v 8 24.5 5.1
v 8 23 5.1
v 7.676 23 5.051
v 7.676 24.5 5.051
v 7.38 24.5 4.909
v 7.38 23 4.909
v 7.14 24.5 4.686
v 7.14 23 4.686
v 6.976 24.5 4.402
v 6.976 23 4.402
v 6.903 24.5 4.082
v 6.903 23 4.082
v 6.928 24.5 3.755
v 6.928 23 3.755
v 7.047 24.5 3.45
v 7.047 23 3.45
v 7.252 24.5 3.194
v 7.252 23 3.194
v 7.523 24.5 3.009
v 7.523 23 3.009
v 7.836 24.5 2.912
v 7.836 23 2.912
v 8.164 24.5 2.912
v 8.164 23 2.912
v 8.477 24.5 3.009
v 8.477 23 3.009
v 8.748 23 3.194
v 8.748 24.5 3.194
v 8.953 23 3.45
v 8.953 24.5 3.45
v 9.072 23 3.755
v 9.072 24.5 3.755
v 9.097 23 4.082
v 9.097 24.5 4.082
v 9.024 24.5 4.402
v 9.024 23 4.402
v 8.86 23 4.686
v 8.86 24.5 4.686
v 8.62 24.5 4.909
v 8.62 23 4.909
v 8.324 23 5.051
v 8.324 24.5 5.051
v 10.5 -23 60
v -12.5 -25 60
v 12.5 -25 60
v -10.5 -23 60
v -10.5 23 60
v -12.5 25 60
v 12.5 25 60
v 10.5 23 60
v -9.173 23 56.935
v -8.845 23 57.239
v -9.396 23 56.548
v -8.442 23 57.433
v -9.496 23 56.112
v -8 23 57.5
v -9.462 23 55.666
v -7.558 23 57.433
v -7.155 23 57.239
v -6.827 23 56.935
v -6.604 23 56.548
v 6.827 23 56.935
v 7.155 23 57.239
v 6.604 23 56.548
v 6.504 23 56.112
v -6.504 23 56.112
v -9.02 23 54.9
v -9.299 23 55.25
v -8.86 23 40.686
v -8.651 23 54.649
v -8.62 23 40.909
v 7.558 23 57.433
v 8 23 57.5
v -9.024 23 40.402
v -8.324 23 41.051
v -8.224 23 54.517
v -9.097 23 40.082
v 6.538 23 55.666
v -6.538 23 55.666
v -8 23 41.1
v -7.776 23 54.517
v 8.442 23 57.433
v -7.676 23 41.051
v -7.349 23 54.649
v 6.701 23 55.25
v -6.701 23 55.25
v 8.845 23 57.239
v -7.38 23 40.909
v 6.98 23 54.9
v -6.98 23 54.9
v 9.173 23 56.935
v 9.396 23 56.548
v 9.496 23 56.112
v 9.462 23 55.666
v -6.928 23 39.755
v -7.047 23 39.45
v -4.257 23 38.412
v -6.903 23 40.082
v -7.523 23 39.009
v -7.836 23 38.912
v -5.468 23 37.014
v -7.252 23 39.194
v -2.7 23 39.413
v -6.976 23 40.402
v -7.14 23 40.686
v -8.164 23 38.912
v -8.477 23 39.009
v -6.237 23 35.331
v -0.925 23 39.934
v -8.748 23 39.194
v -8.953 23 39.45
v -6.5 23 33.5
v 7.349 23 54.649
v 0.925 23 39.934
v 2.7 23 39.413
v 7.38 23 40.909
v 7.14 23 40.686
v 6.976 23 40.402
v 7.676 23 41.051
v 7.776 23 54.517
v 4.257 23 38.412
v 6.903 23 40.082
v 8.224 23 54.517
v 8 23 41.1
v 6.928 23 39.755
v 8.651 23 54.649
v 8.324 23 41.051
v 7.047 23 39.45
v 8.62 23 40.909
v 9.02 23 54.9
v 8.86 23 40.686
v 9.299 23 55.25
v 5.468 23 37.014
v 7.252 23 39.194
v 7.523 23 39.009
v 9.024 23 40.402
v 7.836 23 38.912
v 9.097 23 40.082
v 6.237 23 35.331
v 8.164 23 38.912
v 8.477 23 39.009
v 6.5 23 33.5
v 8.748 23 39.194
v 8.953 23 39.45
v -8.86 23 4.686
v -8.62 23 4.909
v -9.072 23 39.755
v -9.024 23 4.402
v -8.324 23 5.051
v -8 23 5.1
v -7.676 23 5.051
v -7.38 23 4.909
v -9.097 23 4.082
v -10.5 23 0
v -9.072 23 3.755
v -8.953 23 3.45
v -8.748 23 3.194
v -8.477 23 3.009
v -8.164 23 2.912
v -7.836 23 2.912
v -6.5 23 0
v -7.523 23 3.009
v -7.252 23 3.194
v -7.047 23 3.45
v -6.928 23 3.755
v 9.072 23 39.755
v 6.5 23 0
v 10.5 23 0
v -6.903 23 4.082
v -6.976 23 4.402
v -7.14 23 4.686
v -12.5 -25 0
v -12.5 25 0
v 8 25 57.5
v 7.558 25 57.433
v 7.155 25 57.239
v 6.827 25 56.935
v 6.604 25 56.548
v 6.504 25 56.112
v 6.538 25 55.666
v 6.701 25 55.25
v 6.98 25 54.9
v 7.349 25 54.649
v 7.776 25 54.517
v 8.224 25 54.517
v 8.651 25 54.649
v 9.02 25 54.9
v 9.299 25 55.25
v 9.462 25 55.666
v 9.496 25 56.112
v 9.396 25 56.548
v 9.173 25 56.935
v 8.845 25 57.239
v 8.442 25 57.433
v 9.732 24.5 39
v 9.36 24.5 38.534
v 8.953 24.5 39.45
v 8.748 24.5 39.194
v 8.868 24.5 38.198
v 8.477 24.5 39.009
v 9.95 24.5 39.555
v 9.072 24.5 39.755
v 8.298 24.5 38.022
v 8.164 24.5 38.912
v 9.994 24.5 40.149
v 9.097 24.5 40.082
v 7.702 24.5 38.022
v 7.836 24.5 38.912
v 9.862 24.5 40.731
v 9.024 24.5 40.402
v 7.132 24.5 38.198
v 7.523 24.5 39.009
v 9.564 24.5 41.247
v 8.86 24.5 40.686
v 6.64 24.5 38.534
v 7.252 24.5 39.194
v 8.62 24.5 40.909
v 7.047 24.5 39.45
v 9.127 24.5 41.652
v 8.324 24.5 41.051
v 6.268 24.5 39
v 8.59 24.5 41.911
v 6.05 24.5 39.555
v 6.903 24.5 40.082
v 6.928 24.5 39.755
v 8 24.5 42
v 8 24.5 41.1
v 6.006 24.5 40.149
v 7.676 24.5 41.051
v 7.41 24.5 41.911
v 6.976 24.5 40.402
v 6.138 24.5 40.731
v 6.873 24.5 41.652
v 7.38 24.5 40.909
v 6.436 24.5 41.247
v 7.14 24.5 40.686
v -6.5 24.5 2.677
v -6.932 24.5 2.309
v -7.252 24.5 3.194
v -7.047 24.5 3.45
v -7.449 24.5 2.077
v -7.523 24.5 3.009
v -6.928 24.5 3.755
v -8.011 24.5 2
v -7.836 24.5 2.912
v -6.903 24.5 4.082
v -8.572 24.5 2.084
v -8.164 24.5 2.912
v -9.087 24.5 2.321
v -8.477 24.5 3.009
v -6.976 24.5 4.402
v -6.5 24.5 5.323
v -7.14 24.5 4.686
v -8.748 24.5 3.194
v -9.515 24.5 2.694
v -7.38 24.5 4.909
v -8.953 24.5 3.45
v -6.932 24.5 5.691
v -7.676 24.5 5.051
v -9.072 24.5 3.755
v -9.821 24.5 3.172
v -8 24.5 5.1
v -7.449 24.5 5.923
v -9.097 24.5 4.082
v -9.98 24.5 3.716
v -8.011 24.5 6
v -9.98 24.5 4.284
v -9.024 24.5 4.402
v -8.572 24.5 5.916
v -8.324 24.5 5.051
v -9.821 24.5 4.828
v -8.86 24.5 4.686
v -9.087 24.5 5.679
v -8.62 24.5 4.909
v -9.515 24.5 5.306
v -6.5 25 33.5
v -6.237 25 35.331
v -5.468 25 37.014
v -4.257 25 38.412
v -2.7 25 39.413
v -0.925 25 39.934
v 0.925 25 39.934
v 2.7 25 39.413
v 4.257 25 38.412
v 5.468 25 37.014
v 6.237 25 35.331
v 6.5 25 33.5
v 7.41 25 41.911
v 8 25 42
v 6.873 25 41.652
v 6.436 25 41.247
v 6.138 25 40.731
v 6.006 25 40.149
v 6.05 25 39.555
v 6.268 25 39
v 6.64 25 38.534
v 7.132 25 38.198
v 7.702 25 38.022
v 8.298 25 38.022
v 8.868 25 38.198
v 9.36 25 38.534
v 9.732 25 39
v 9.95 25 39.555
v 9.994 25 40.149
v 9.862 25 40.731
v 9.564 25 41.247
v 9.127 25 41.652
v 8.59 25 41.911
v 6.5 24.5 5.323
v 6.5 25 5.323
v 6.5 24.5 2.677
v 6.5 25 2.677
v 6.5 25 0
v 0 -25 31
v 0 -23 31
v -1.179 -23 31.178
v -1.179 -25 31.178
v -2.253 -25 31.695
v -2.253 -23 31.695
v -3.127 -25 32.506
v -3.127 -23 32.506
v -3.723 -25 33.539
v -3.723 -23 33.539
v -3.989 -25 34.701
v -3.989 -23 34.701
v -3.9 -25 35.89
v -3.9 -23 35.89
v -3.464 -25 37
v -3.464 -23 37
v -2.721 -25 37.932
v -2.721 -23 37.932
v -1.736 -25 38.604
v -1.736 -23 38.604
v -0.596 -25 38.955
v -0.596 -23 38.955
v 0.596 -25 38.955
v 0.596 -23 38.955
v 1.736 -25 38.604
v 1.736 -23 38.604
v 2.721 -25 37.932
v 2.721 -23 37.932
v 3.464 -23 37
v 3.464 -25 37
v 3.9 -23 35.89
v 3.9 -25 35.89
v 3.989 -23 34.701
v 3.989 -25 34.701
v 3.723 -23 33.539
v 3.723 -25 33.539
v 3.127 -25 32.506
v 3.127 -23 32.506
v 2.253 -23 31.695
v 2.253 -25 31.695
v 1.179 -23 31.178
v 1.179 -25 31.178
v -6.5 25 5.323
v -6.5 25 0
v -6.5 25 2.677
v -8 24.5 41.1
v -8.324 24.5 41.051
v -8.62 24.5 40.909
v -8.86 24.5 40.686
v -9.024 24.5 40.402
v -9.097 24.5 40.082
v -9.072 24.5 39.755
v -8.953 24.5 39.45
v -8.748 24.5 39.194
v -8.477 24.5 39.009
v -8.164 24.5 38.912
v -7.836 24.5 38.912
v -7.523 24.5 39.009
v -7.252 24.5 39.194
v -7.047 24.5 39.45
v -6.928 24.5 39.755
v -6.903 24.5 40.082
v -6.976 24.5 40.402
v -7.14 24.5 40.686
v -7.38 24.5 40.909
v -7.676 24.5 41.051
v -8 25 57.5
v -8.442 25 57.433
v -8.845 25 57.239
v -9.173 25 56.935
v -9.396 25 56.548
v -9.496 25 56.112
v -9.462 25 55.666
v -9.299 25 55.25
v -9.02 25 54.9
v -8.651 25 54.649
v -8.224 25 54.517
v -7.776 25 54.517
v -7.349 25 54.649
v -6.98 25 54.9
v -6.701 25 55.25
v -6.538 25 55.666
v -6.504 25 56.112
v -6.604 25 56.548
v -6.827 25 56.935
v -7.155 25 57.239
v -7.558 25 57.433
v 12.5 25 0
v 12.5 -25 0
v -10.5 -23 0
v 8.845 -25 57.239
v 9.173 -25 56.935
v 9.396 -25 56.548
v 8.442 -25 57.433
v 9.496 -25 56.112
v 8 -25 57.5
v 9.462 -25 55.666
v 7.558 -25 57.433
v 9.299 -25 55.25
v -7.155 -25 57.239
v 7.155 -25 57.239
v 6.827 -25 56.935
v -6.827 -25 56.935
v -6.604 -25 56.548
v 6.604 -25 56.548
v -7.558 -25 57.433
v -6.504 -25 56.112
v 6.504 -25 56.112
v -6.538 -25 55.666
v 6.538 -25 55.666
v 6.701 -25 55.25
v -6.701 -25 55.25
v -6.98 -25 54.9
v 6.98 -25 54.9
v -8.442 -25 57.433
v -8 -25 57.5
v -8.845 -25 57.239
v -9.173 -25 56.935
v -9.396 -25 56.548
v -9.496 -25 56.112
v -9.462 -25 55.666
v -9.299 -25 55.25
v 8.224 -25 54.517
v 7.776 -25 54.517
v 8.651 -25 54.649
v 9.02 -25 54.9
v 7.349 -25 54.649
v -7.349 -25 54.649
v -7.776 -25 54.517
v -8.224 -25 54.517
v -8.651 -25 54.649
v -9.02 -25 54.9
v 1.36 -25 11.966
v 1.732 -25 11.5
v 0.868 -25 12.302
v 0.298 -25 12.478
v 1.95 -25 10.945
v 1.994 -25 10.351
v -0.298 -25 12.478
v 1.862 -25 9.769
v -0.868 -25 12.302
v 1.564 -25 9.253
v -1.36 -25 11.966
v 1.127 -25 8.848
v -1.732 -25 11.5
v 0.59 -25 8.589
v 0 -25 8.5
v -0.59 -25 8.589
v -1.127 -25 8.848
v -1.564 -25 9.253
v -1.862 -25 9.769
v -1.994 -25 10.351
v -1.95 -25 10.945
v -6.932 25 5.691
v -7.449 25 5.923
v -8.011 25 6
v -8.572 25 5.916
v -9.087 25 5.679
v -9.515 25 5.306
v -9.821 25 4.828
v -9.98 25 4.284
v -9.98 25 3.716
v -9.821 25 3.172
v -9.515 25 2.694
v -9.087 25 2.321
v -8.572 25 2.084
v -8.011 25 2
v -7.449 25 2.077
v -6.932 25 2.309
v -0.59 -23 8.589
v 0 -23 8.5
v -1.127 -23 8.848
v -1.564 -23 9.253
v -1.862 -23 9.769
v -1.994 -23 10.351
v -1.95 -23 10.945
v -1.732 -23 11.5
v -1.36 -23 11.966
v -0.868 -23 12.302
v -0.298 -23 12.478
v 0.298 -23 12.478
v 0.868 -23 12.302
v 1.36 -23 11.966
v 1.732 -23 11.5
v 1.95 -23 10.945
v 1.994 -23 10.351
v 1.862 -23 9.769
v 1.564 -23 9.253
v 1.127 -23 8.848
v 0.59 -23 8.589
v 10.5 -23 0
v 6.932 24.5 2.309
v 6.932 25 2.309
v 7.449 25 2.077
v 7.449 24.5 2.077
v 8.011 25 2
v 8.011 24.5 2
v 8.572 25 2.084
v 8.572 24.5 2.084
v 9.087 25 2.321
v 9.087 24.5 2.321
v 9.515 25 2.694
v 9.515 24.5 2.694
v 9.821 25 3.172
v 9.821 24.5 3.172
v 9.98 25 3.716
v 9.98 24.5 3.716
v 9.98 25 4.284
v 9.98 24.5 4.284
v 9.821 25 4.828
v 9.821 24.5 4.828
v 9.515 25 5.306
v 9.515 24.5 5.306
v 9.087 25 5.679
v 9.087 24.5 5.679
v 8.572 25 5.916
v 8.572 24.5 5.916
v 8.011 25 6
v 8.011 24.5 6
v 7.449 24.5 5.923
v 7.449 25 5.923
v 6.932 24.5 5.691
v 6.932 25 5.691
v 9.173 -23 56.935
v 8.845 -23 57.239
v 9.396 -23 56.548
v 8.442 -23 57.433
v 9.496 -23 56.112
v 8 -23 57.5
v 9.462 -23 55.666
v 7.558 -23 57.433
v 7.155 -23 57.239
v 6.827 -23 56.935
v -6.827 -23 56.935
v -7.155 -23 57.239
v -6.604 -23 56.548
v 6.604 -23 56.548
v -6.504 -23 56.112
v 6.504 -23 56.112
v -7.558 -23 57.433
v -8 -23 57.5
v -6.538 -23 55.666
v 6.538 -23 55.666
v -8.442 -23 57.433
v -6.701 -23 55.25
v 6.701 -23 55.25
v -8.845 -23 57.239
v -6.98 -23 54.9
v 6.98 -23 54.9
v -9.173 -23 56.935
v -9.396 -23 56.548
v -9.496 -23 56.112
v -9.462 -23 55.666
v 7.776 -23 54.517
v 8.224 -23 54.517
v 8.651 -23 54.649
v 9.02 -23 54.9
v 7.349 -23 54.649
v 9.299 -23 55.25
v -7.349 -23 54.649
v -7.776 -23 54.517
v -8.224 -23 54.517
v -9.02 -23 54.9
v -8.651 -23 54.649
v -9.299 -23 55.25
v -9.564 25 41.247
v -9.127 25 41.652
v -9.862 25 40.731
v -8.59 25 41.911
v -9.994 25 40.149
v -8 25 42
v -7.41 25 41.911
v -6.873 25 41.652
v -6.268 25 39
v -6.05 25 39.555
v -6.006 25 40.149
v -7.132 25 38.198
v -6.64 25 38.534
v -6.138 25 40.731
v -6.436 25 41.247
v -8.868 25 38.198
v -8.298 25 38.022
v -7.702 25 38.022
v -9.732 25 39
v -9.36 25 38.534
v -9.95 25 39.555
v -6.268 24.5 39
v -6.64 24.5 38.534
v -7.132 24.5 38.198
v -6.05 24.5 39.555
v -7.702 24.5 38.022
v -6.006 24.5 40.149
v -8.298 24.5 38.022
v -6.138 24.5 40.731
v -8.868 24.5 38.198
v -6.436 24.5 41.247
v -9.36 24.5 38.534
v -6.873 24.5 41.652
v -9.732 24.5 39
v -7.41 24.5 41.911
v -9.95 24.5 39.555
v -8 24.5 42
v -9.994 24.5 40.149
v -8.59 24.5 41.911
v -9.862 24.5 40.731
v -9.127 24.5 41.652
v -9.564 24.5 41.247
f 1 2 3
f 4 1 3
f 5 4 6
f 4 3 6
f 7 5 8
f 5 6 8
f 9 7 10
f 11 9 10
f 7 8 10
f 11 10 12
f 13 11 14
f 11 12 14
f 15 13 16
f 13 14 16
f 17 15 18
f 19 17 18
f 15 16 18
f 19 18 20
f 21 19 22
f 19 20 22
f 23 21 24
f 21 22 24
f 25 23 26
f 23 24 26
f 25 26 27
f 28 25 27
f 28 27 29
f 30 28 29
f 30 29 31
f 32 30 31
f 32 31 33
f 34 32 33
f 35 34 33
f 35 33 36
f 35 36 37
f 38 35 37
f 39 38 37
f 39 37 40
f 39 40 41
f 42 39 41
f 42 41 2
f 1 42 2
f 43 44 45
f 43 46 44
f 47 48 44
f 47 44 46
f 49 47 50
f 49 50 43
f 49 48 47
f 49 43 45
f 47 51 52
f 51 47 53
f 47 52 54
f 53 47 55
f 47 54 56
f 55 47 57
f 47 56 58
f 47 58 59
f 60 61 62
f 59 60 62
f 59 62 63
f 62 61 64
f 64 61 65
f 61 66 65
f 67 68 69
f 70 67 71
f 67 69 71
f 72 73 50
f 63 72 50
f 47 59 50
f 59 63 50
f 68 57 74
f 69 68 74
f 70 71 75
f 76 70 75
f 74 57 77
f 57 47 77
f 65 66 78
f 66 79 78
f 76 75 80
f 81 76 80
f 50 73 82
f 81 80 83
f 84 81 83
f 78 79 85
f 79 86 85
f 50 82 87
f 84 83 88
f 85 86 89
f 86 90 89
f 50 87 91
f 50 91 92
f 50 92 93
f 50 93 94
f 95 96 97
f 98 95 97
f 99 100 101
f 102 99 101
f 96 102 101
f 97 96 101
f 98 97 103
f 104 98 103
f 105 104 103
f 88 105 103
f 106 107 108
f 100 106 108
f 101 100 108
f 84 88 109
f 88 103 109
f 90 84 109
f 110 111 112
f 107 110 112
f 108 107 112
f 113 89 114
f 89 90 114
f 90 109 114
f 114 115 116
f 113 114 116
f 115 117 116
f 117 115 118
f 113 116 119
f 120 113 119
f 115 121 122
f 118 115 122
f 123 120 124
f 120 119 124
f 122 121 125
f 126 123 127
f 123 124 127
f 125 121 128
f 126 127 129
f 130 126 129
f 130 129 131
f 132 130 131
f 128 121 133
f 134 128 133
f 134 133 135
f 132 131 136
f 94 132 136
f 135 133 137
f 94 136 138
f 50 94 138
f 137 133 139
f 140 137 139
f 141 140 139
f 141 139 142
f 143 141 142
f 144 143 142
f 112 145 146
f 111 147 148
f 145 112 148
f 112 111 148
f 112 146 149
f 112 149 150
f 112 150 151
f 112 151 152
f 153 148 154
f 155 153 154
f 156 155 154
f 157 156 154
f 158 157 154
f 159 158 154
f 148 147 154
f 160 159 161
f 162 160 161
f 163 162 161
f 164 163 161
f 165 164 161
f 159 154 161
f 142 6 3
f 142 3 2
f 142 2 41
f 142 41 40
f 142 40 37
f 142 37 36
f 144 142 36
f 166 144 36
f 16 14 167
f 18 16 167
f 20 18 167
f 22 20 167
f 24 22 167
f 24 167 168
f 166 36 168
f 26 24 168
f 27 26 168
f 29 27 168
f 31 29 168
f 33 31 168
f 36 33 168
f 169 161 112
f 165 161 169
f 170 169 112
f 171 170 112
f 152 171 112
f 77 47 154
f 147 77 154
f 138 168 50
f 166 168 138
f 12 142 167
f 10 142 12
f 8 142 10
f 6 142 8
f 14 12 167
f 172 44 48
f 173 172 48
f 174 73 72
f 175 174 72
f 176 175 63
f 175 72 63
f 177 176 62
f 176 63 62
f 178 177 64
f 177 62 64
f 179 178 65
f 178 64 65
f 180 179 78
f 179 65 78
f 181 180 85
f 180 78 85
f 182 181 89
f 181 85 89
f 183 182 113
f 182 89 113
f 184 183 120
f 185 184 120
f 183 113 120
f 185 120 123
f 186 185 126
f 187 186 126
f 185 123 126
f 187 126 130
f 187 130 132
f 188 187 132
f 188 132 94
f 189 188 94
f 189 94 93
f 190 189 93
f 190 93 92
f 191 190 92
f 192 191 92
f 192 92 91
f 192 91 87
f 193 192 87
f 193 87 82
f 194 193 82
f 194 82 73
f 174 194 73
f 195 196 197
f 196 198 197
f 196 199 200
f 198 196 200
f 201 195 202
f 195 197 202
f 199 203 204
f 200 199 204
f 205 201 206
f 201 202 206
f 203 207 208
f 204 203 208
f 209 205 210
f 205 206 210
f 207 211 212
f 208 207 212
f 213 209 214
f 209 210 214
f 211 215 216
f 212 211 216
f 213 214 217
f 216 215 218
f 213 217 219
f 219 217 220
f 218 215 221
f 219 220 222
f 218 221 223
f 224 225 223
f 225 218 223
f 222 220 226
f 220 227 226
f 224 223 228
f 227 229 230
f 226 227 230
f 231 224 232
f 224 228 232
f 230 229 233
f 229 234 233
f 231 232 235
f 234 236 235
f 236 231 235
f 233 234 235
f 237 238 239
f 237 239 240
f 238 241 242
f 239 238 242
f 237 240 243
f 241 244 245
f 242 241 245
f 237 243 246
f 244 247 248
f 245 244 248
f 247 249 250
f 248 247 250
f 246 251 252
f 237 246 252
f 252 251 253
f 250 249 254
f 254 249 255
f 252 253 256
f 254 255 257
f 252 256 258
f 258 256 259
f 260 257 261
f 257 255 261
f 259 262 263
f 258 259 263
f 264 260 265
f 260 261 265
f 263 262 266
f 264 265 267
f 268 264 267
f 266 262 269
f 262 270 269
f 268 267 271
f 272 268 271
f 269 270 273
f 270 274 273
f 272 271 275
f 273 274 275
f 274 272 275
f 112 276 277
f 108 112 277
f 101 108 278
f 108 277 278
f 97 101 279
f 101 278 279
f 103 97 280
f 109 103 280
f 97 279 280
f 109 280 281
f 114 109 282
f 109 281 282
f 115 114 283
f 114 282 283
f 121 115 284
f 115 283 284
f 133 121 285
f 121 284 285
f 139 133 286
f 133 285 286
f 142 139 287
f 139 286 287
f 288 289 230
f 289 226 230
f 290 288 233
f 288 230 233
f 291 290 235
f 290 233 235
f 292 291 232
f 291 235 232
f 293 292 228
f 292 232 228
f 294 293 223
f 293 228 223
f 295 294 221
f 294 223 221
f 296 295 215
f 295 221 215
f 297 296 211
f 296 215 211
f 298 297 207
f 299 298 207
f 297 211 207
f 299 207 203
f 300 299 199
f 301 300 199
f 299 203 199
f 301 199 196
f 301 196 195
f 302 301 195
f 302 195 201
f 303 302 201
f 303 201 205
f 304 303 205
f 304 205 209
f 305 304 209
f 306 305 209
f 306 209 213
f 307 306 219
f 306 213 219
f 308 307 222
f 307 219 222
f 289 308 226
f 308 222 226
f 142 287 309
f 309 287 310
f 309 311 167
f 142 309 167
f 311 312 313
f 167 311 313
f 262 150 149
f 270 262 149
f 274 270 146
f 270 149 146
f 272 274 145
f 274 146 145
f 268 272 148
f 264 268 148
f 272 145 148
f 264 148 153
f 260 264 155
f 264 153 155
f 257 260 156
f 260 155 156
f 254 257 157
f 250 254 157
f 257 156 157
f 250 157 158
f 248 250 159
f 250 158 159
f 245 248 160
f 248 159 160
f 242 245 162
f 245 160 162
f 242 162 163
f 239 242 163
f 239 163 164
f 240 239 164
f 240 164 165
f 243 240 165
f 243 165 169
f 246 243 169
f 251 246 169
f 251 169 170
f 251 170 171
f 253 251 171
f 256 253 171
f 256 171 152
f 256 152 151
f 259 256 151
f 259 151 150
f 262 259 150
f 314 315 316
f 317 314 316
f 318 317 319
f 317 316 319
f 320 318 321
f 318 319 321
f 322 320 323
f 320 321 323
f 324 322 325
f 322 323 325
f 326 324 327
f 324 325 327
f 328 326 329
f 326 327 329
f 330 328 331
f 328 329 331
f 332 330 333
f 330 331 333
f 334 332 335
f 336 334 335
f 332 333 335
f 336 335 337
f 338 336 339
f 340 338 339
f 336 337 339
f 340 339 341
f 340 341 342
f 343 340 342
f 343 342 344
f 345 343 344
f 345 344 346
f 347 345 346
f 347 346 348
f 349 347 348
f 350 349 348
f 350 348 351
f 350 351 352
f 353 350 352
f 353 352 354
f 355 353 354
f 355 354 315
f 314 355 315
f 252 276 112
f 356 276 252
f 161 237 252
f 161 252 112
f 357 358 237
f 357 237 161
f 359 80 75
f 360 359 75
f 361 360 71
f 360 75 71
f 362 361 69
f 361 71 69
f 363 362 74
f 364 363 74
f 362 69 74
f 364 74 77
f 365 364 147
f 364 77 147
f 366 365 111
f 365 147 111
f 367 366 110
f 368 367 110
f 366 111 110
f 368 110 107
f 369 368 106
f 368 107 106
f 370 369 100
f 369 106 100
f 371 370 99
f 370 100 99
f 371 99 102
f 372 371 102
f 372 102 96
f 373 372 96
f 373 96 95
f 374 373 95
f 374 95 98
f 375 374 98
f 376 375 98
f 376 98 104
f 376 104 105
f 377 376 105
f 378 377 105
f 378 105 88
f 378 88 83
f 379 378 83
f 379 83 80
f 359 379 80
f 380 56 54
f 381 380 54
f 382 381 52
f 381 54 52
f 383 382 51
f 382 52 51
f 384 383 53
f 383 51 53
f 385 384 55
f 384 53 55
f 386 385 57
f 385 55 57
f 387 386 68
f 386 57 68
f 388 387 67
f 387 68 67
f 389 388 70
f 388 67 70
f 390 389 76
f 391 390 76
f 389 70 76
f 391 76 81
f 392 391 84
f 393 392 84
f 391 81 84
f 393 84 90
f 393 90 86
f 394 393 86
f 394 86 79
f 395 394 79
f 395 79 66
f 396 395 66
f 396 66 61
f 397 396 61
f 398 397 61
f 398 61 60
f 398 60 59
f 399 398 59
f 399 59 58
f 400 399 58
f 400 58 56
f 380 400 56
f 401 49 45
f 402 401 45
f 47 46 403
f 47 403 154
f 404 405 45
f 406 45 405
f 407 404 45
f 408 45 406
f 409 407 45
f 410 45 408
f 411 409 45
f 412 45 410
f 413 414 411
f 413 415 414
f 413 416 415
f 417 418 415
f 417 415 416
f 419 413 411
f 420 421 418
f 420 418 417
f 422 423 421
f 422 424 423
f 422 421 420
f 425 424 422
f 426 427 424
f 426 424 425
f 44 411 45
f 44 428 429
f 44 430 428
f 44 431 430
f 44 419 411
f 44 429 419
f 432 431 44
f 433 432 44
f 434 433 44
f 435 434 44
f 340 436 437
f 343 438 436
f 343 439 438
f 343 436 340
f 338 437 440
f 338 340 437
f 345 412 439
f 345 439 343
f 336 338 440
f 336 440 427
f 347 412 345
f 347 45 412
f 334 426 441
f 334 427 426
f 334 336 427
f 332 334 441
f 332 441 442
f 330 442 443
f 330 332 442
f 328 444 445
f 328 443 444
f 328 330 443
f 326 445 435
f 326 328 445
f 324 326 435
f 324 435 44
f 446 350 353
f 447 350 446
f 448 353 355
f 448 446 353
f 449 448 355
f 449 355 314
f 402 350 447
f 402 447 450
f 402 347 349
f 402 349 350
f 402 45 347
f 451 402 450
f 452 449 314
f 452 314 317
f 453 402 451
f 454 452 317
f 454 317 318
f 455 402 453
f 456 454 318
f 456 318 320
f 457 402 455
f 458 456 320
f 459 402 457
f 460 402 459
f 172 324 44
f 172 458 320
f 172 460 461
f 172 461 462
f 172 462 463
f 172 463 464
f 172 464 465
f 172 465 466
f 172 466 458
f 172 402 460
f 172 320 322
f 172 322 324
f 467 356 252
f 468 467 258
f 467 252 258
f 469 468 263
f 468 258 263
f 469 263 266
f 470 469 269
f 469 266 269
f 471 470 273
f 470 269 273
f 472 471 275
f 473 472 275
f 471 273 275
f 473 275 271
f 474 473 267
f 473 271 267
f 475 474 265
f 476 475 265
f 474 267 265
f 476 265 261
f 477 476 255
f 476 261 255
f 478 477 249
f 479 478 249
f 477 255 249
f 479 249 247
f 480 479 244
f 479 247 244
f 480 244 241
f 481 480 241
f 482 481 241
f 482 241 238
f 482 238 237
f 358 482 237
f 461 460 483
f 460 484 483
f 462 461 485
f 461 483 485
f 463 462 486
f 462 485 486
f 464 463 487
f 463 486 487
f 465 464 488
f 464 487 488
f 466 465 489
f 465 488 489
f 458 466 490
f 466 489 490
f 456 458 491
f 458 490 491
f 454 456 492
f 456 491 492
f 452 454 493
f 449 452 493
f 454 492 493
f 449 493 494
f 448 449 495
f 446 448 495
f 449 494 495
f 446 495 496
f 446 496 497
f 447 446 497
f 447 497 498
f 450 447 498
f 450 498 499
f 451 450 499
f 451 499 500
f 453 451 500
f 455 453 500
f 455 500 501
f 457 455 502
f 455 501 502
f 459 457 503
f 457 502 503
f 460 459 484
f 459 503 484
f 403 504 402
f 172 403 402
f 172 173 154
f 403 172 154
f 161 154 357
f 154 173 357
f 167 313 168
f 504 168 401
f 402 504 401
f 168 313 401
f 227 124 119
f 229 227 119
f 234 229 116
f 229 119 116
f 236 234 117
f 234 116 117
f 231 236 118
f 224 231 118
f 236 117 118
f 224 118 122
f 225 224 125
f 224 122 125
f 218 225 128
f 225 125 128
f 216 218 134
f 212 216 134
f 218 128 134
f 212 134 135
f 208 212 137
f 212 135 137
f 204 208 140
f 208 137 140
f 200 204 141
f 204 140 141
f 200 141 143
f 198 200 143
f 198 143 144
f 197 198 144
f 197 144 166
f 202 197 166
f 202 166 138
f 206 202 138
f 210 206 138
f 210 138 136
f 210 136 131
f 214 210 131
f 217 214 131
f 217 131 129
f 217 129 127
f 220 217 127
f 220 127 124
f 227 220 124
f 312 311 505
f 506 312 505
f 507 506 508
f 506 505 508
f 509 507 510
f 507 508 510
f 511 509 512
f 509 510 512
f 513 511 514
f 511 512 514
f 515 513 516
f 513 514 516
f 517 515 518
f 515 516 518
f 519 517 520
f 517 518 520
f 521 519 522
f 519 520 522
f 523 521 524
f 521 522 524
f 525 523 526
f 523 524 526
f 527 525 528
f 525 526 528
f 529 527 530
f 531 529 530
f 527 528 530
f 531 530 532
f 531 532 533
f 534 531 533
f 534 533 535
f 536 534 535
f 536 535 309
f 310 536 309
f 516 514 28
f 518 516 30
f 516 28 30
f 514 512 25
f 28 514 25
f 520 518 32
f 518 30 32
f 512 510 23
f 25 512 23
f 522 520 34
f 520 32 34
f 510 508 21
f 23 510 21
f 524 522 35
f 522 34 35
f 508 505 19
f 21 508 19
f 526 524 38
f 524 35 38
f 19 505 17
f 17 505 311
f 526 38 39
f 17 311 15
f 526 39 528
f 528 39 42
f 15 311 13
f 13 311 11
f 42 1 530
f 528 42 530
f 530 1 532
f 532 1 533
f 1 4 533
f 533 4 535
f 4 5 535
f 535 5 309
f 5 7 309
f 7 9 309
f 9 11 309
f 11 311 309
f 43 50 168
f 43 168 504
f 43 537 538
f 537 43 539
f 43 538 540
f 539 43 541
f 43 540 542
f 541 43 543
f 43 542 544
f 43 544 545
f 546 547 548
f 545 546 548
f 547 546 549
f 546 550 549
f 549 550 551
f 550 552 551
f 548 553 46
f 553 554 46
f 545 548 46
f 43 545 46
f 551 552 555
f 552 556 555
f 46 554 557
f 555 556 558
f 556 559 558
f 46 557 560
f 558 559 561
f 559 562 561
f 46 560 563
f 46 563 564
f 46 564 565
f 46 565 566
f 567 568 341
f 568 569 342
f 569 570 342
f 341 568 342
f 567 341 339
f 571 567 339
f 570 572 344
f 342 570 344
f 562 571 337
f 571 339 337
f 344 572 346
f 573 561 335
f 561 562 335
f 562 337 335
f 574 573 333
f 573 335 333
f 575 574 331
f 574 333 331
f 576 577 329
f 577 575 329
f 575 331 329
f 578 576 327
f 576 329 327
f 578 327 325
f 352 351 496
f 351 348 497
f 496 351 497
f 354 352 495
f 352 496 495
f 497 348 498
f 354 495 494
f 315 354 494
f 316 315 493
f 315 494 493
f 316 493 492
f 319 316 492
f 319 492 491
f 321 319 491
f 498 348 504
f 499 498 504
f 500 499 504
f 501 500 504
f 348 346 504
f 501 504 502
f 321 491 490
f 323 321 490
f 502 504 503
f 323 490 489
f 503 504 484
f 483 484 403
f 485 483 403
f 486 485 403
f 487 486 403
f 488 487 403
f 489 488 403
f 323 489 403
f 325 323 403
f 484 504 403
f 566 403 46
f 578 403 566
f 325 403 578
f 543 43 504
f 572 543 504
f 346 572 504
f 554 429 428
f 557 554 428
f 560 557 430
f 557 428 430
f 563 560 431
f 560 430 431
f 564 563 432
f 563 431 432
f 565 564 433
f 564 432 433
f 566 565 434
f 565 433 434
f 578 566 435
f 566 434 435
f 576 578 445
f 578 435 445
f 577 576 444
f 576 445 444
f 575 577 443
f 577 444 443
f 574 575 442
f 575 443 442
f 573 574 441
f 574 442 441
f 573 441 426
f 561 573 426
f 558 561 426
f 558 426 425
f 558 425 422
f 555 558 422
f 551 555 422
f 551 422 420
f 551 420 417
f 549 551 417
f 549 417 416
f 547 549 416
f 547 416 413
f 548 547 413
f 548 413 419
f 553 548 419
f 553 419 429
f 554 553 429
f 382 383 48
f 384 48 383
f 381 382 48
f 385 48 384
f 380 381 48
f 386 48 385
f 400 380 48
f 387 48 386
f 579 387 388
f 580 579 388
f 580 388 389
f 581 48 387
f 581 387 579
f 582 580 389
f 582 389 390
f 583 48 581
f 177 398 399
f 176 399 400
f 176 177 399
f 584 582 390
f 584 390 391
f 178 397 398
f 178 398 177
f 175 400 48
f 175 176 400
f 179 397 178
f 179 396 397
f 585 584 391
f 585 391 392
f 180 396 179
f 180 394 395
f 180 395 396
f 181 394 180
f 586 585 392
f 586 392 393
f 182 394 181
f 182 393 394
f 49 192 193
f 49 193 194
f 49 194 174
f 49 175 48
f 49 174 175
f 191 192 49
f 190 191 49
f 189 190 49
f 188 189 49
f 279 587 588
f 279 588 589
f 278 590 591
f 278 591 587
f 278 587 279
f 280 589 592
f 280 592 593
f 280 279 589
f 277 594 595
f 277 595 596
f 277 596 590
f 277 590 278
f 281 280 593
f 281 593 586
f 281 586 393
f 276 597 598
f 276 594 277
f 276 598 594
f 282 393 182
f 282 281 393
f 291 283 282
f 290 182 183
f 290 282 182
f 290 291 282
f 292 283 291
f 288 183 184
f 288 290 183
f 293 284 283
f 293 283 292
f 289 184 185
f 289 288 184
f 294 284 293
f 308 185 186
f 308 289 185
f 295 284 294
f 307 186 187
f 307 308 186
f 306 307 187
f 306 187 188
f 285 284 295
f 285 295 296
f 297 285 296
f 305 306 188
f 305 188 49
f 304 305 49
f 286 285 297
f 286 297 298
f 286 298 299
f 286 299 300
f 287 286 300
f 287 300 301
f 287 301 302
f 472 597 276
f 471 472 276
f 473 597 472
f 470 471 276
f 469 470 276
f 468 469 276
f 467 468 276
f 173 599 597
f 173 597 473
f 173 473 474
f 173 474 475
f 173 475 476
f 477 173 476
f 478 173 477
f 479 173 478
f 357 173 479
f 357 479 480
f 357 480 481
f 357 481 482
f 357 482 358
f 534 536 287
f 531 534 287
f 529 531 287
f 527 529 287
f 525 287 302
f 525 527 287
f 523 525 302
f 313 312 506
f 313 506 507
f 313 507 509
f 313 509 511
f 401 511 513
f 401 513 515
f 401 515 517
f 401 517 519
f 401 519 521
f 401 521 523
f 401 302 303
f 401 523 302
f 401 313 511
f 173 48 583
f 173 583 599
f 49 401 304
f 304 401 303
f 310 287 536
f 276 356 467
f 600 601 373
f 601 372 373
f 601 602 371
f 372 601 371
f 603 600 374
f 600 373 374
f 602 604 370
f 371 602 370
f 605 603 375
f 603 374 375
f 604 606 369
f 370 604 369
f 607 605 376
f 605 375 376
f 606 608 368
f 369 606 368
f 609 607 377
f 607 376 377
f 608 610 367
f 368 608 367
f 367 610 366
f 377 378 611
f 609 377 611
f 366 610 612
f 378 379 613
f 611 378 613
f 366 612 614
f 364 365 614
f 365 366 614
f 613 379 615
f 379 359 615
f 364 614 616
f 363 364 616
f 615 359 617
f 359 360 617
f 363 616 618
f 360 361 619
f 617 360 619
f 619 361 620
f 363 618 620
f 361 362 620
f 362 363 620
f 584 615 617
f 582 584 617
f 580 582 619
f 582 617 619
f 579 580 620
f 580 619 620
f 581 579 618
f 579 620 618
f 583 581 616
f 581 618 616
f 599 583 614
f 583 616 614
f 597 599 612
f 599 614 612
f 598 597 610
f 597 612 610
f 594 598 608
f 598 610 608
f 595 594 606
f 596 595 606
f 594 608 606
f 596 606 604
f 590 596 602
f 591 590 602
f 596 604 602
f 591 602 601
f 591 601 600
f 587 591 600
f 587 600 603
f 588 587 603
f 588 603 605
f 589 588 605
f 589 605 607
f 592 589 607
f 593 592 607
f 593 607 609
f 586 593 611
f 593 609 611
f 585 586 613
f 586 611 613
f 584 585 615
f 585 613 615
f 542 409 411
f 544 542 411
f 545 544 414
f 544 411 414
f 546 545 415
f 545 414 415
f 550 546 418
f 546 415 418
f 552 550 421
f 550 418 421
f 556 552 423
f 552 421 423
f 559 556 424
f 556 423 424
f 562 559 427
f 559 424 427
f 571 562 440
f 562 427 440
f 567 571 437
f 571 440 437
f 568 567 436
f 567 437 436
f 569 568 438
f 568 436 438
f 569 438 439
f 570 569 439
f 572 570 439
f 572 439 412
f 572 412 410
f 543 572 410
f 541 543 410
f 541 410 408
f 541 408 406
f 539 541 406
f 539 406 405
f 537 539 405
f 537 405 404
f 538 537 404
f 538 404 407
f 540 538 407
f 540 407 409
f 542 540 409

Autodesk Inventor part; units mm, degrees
ref_plane "YZ Plane" through (0, 0, 0) normal (1, 0, 0) x (0, 1, 0)
ref_plane "XZ Plane" through (0, 0, 0) normal (0, 1, 0) x (-1, 0, 0)
ref_plane "XY Plane" through (0, 0, 0) normal (0, 0, 1) x (1, 0, 0)
sketch "スケッチ1" plane through (0, 0, 0) normal (0, 0, 1) x (1, 0, 0)
  line L0 (-12.5, 25) -> (12.5, 25)
  line L1 (12.5, 25) -> (12.5, -25)
  line L2 (12.5, -25) -> (-12.5, -25)
  line L3 (-12.5, -25) -> (-12.5, 25)
  line L4 (-10.5, 23) -> (10.5, 23)
  line L5 (10.5, 23) -> (10.5, -23)
  line L6 (10.5, -23) -> (-10.5, -23)
  line L7 (-10.5, -23) -> (-10.5, 23)
  point P0 (0, 0)
  dimension "d0" = 25
  dimension "d1" = 50
  dimension "d2" = 46
  dimension "d3" = 21
  dimension "d4" = 25
  dimension "d5" = 23
  dimension "d6" = 10.5
  dimension "d7" = 12.5
extrude "押し出し1" add sketch "スケッチ1" along normal blind 60
sketch "スケッチ2" plane through (-12.5, 25, 0) normal (0, 1, 0) x (1, 0, 0)
  line L0 (0, 0) -> (25, 0) projected
  line L1 (0, 0) -> (0, -60) projected
  arc A0 (6, -33.5) -> (19, -33.5) centre (12.5, -33.5) ccw
  line L2 (6, -33.5) -> (6, 0)
  line L3 (19, -33.5) -> (19, 0)
  point P0 (12.5, 0)
  dimension "d10" = 13
  dimension "d11" = 33.5
  dimension "d12" = 12.5
extrude "押し出し2" cut sketch "スケッチ2" against normal blind 2
sketch "スケッチ3" plane through (-12.5, 25, 60) normal (0, 1, 0) x (1, 0, 0)
  arc A0 (6, 26.5) -> (19, 26.5) centre (12.5, 26.5) ccw projected
  circle A1 centre (4.5, 20) radius 1.1
  circle A2 centre (4.5, 56) radius 1.1
  circle A3 centre (20.5, 56) radius 1.1
  circle A4 centre (20.5, 20) radius 1.1
  point P0 (12.5, 60)
  dimension "d15" = 6.5
  dimension "d16" = 6.5
  dimension "d17" = 2.2
  dimension "d18" = 8
  dimension "d19" = 8
  dimension "d20" = 8
  dimension "d21" = 8
  dimension "d22" = 29.5
  dimension "d23" = 29.5
hole "穴1" at (-8, 25, 4) at (8, 25, 4) at (8, 25, 40) at (-8, 25, 40) direction (0, -1, 0) diameter 2.2 depth 2 tip angle 118 counterbore diameter 4 counterbore depth 0.5
sketch "スケッチ4" plane through (-12.5, -25, 0) normal (0, -1, 0) x (1, 0, 0)
  line L0 (25, 0) -> (0, 0) projected
  line L1 (25, 0) -> (25, 60) projected
  circle A0 centre (12.5, 10.5) radius 2
  point P0 (12.5, 0)
  dimension "d31" = 4
  dimension "d32" = 12.5
  dimension "d33" = 10.5
hole "穴2" at (0, -25, 10.5) direction (0, 1, 0) diameter 4 end through all
sketch "スケッチ5" plane through (-12.5, 25, 60) normal (0, 1, 0) x (1, 0, 0)
  line L0 (0, 0) -> (25, 0) projected
  arc A0 (6, 26.5) -> (19, 26.5) centre (12.5, 26.5) ccw projected
  circle A1 centre (20.5, 4) radius 1.5
  circle A2 centre (4.5, 4) radius 1.5
  point P0 (12.5, 60)
  dimension "d43" = 4
  dimension "d44" = 4
  dimension "d46" = 8
  dimension "d47" = 8
  dimension "d57" = 3
hole "穴4" at (-8, 25, 56) at (8, 25, 56) direction (0, -1, 0) diameter 3 end through all
thread "ねじ1" size "M3x0.5" class "6H" standard "ANSI Metric M Profile" full length
thread "ねじ2" size "M3x0.5" class "6H" standard "ANSI Metric M Profile" full length
thread "ねじ3" size "M3x0.5" class "6H" standard "ANSI Metric M Profile" full length
thread "ねじ4" size "M3x0.5" class "6H" standard "ANSI Metric M Profile" full length
sketch "スケッチ7" plane through (-12.5, -25, 0) normal (0, -1, 0) x (1, 0, 0)
  line L0 (25, 60) -> (0, 60) projected
  line L1 (25, 0) -> (25, 60) projected
  circle A0 centre (12.5, 35) radius 4
  point P0 (12.5, 0)
  dimension "d78" = 25
  dimension "d79" = 8
  dimension "d80" = 12.5
hole "穴5" at (0, -25, 35) direction (0, 1, 0) diameter 8 end through all
properties part number "07" material "アルミニウム 6061"
